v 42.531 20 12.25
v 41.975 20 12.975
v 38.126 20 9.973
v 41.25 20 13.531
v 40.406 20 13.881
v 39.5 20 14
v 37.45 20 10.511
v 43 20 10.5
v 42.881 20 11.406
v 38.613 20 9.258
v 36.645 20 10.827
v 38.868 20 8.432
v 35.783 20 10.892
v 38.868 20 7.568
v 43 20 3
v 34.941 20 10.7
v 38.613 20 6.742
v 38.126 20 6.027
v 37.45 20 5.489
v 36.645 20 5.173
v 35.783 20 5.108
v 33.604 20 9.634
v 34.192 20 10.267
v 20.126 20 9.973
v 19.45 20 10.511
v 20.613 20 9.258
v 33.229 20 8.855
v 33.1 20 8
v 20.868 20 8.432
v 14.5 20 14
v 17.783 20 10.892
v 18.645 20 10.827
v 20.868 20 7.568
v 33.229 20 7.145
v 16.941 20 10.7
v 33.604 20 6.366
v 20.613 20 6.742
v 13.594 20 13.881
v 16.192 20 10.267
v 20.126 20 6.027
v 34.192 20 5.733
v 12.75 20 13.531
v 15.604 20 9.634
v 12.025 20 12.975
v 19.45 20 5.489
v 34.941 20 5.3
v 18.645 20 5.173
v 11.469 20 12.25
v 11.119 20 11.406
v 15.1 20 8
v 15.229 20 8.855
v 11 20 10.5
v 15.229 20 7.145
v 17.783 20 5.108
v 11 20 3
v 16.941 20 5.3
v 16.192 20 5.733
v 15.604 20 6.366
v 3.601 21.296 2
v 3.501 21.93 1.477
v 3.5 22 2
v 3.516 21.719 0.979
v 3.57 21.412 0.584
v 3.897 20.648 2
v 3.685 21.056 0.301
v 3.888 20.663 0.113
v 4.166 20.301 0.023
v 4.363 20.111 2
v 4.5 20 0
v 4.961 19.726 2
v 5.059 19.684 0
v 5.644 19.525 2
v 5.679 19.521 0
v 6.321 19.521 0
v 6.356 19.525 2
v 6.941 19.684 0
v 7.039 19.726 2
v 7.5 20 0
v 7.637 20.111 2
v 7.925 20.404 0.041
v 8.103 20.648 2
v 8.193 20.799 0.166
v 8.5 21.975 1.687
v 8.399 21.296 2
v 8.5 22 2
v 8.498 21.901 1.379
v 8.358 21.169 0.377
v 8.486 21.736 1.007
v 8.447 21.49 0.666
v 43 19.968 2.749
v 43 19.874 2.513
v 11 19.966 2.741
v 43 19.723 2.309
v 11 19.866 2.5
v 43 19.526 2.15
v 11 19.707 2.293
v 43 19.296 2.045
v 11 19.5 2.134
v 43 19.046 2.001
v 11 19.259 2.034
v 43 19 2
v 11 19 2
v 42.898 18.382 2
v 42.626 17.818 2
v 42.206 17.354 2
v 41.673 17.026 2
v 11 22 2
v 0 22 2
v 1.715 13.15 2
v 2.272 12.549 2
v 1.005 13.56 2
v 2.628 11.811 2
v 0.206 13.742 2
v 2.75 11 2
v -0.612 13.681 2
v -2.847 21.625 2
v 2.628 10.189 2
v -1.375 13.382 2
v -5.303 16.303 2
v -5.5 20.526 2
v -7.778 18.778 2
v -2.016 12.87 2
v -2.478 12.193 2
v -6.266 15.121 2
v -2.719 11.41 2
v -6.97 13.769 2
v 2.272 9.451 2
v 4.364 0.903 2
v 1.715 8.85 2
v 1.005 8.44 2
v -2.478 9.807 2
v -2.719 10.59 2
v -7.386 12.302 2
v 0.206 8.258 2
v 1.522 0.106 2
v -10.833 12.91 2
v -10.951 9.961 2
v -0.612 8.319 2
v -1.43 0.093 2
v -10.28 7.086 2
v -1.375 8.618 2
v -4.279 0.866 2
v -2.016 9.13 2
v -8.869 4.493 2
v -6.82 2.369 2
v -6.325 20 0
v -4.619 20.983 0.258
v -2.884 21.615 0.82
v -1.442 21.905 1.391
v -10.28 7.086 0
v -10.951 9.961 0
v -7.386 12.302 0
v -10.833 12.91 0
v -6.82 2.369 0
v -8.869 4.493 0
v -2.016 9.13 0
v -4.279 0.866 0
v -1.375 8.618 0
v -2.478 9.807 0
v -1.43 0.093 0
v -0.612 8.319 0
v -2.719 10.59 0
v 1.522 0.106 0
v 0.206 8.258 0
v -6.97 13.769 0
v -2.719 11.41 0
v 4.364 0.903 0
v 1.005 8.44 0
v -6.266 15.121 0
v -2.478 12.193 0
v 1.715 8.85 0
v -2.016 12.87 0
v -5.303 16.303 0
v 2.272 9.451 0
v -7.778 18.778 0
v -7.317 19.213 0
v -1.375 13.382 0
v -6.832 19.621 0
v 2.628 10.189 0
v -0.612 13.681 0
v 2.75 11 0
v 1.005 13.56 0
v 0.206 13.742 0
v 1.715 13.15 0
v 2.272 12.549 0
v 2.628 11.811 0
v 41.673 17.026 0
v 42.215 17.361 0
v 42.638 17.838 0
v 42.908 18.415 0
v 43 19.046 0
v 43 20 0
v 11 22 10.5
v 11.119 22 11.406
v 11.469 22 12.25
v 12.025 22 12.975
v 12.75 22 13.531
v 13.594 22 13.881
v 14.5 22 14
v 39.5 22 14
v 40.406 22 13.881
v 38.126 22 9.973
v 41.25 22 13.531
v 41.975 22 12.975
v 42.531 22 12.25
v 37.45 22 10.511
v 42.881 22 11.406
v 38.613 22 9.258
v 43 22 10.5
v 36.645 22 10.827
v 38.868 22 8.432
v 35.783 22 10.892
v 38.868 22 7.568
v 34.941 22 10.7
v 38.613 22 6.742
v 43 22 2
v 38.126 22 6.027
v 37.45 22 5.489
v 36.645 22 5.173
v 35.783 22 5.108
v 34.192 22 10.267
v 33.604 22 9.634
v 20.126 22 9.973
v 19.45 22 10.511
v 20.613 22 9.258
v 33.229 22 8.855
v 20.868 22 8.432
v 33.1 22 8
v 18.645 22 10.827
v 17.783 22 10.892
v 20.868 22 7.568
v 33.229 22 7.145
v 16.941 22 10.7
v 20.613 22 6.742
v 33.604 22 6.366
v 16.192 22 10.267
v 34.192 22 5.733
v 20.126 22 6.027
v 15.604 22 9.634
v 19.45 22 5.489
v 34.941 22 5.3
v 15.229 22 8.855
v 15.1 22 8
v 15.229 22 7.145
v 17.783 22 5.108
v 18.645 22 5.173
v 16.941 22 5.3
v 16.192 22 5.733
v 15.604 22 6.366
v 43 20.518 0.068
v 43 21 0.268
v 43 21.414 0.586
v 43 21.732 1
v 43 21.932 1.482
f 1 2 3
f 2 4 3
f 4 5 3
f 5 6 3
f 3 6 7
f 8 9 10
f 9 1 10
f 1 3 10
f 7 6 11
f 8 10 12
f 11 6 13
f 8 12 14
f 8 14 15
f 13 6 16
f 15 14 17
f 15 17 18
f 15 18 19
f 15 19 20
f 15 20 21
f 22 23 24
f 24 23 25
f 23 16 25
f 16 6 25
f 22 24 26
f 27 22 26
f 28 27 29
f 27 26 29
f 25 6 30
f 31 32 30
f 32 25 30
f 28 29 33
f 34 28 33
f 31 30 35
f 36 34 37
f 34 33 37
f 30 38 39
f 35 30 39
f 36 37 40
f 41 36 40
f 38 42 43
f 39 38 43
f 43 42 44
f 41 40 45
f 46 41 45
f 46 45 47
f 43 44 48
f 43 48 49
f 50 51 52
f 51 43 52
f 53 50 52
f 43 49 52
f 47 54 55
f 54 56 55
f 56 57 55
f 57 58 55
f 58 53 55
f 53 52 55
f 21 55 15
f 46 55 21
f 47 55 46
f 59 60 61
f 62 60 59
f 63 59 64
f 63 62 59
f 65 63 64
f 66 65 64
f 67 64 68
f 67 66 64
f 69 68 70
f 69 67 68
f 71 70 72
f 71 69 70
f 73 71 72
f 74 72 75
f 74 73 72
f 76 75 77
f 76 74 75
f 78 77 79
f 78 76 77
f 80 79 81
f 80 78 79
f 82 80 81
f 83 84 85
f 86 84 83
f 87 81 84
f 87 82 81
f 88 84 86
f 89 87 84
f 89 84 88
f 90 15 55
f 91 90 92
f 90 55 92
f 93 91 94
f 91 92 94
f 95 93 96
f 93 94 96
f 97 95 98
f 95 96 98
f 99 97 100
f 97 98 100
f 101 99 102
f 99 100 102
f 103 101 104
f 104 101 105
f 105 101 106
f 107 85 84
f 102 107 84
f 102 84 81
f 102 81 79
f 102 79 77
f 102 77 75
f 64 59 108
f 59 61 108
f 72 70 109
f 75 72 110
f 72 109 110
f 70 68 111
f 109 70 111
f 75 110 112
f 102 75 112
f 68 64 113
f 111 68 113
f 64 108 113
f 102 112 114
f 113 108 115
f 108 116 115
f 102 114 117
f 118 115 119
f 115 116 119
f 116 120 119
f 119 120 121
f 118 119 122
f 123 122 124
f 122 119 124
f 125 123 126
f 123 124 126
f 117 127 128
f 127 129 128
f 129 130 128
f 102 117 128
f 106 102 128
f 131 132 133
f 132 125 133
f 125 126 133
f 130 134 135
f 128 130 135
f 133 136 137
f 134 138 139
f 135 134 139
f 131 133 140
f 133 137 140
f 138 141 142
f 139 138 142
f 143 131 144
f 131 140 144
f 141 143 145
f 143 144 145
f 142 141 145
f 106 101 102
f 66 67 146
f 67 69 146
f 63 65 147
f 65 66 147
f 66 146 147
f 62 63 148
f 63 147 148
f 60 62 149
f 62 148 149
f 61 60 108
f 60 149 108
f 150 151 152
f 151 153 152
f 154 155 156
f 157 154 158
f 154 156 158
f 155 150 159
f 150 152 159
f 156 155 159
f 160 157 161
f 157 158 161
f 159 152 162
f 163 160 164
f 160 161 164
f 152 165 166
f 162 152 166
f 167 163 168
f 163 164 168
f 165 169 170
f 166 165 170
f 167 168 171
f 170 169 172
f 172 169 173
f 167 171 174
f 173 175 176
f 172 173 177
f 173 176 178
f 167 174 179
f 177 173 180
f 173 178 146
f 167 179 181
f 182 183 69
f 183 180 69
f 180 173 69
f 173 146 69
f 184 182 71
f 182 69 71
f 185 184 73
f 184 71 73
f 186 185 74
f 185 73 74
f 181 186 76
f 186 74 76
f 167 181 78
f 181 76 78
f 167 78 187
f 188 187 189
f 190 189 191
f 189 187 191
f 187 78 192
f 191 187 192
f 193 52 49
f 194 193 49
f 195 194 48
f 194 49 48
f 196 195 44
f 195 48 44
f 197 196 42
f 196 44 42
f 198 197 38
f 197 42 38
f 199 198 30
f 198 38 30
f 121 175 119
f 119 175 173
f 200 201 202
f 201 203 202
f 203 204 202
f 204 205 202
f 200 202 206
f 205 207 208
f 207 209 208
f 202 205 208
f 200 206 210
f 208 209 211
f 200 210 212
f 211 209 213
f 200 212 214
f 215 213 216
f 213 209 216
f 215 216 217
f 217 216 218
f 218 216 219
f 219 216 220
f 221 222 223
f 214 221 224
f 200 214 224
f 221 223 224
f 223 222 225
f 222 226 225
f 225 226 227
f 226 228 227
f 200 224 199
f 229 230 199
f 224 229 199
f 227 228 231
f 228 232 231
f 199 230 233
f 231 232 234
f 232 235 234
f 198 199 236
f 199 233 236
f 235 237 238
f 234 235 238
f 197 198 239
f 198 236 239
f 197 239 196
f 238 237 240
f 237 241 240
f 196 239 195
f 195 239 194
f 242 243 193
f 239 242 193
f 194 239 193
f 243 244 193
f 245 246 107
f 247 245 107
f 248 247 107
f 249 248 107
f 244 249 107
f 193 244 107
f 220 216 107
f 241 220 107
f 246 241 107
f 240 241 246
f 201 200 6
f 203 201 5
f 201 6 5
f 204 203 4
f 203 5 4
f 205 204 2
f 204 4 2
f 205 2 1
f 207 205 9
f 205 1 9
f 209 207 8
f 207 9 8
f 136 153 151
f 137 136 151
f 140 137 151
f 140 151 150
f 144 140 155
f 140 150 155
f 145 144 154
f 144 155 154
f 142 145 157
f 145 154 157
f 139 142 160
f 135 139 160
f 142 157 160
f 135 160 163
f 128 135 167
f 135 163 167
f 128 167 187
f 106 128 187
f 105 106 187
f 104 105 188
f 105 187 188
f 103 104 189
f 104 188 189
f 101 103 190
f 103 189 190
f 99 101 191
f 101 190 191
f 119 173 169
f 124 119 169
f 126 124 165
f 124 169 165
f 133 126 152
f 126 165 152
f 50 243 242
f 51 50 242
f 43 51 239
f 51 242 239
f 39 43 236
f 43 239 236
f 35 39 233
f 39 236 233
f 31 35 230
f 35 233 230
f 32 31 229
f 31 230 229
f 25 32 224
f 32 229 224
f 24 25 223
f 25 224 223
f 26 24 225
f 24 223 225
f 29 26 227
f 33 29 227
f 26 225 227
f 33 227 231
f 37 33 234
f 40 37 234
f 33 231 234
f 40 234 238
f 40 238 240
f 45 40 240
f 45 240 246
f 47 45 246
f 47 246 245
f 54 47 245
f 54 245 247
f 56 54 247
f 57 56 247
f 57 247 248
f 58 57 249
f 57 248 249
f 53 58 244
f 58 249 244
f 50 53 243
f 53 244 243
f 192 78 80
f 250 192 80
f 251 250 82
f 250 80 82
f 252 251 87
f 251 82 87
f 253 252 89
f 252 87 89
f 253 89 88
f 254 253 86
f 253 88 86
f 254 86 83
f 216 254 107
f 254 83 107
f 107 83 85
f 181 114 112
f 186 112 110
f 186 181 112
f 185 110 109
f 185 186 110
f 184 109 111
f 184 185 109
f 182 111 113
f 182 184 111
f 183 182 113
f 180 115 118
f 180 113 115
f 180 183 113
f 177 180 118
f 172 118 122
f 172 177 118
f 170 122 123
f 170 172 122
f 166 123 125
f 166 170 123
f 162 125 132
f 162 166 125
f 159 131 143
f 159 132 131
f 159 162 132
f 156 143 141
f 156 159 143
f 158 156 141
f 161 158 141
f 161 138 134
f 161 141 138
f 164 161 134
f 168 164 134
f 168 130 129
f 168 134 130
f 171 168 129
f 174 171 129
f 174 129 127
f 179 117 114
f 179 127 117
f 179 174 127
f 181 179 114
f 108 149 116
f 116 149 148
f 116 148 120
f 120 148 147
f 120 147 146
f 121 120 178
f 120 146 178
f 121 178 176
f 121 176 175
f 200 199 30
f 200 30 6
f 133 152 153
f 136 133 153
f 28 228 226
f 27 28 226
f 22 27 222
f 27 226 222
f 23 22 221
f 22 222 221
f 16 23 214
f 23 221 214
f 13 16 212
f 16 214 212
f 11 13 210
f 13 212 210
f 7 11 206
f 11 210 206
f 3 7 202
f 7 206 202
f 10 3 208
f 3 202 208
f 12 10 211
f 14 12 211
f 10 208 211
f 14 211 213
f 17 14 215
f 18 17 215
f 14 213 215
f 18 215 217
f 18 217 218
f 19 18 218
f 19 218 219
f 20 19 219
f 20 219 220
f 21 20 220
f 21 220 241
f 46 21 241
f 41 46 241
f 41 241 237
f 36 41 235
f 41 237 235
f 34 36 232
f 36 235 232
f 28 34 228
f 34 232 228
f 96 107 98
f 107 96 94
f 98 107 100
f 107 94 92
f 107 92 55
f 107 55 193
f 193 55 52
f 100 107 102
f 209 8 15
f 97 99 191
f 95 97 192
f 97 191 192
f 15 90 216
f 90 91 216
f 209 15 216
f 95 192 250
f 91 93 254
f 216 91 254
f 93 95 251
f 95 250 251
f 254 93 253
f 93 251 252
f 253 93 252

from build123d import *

# Parameters (mm, degrees)
SKETCH1_R               = 2.75
BOSS_EXTRUDE1_DEPTH     = 14
SKETCH2_W               = 24
SKETCH2_H               = 32
CUT_EXTRUDE1_DEPTH      = 65
CUT_EXTRUDE1_DEPTH_BACK = 65
SKETCH3_W               = 64
SKETCH3_H               = 24
CUT_EXTRUDE2_DEPTH      = 22
SKETCH4_R               = 2.9
CUT_EXTRUDE3_DEPTH      = 2
CUT_EXTRUDE3_DEPTH_BACK = 2
SKETCH5_R               = 2.9
CUT_EXTRUDE4_DEPTH      = 2
CUT_EXTRUDE4_DEPTH_BACK = 2
SKETCH6_R               = 2.5
CUT_EXTRUDE5_DEPTH      = 14


with BuildPart() as part:
    # Sketch1 → Boss-Extrude1 (new body)
    with BuildSketch(Plane.XY):
        with BuildLine():
            Line((4.363786096, 0.902605737), (41.672757219, 17.026406116))
            ThreePointArc((41.672757219, 17.026406116), (42.63848659, 17.837594003), (43, 19.045884969))
            Line((43, 19.045884969), (43, 22))
            Line((43, 22), (0, 22))
            ThreePointArc((0, 22), (-4.209517756, 21.162674858), (-7.778174593, 18.778174593))
            Line((-7.778174593, 18.778174593), (-5.303300859, 16.303300859))
            ThreePointArc((-5.303300859, 16.303300859), (-6.652581249, 14.463114599), (-7.386058148, 12.302361333))
            Line((-7.386058148, 12.302361333), (-10.832885283, 12.910129954))
            ThreePointArc((-10.832885283, 12.910129954), (-6.819638592, 2.369094516), (4.363786096, 0.902605737))
        make_face()
        with Locations((0, 11)):
            Circle(SKETCH1_R, mode=Mode.SUBTRACT)
    extrude(amount=BOSS_EXTRUDE1_DEPTH)

    # Sketch2 → Cut-Extrude1 (cut, two sides)
    with BuildSketch(Plane(origin=(0, 0, 0), x_dir=(0, 0, -1), z_dir=(1, 0, 0))) as cut_extrude1_sk:
        with Locations((-7, 11)):
            Rectangle(SKETCH2_W, SKETCH2_H)
        with BuildLine():
            Line((-14, 20), (-3, 20))
            ThreePointArc((-3, 20), (-2.292893219, 19.707106781), (-2, 19))
            Line((-2, 19), (-2, 0))
            Line((-2, 0), (0, 0))
            Line((0, 0), (0, 20))
            ThreePointArc((0, 20), (-0.585786438, 21.414213562), (-2, 22))
            Line((-2, 22), (-14, 22))
            Line((-14, 22), (-14, 20))
        make_face(mode=Mode.SUBTRACT)
    extrude(amount=CUT_EXTRUDE1_DEPTH, mode=Mode.SUBTRACT)
    extrude(cut_extrude1_sk.sketch, amount=-CUT_EXTRUDE1_DEPTH_BACK, mode=Mode.SUBTRACT)

    # Sketch3 → Cut-Extrude2 (cut)
    with BuildSketch(Plane(origin=(0, 0, 0), x_dir=(-1, 0, 0), z_dir=(0, 1, 0))):
        with Locations((-16, 7)):
            Rectangle(SKETCH3_W, SKETCH3_H)
        with BuildLine():
            Line((11, 0), (11, 2))
            Line((11, 2), (-11, 2))
            Line((-11, 2), (-11, 10.5))
            ThreePointArc((-11, 10.5), (-12.025126266, 12.974873734), (-14.5, 14))
            Line((-14.5, 14), (-39.5, 14))
            ThreePointArc((-39.5, 14), (-41.974873734, 12.974873734), (-43, 10.5))
            Line((-43, 10.5), (-43, 0))
            Line((-43, 0), (11, 0))
        make_face(mode=Mode.SUBTRACT)
    extrude(amount=CUT_EXTRUDE2_DEPTH, mode=Mode.SUBTRACT)

    # Sketch4 → Cut-Extrude3 (cut, two sides)
    with BuildSketch(Plane(origin=(0, 22, 0), x_dir=(-1, 0, 0), z_dir=(0, 1, 0))) as cut_extrude3_sk:
        with Locations((-18, 8)):
            Circle(SKETCH4_R)
    extrude(amount=CUT_EXTRUDE3_DEPTH, mode=Mode.SUBTRACT)
    extrude(cut_extrude3_sk.sketch, amount=-CUT_EXTRUDE3_DEPTH_BACK, mode=Mode.SUBTRACT)

    # Sketch5 → Cut-Extrude4 (cut, two sides)
    with BuildSketch(Plane(origin=(0, 22, 0), x_dir=(-1, 0, 0), z_dir=(0, 1, 0))) as cut_extrude4_sk:
        with Locations((-36, 8)):
            Circle(SKETCH5_R)
    extrude(amount=CUT_EXTRUDE4_DEPTH, mode=Mode.SUBTRACT)
    extrude(cut_extrude4_sk.sketch, amount=-CUT_EXTRUDE4_DEPTH_BACK, mode=Mode.SUBTRACT)

    # Sketch6 → Cut-Extrude5 (cut)
    with BuildSketch(Plane.XY):
        with Locations((6, 22)):
            Circle(SKETCH6_R)
    extrude(amount=CUT_EXTRUDE5_DEPTH, mode=Mode.SUBTRACT)


solid = part.part
